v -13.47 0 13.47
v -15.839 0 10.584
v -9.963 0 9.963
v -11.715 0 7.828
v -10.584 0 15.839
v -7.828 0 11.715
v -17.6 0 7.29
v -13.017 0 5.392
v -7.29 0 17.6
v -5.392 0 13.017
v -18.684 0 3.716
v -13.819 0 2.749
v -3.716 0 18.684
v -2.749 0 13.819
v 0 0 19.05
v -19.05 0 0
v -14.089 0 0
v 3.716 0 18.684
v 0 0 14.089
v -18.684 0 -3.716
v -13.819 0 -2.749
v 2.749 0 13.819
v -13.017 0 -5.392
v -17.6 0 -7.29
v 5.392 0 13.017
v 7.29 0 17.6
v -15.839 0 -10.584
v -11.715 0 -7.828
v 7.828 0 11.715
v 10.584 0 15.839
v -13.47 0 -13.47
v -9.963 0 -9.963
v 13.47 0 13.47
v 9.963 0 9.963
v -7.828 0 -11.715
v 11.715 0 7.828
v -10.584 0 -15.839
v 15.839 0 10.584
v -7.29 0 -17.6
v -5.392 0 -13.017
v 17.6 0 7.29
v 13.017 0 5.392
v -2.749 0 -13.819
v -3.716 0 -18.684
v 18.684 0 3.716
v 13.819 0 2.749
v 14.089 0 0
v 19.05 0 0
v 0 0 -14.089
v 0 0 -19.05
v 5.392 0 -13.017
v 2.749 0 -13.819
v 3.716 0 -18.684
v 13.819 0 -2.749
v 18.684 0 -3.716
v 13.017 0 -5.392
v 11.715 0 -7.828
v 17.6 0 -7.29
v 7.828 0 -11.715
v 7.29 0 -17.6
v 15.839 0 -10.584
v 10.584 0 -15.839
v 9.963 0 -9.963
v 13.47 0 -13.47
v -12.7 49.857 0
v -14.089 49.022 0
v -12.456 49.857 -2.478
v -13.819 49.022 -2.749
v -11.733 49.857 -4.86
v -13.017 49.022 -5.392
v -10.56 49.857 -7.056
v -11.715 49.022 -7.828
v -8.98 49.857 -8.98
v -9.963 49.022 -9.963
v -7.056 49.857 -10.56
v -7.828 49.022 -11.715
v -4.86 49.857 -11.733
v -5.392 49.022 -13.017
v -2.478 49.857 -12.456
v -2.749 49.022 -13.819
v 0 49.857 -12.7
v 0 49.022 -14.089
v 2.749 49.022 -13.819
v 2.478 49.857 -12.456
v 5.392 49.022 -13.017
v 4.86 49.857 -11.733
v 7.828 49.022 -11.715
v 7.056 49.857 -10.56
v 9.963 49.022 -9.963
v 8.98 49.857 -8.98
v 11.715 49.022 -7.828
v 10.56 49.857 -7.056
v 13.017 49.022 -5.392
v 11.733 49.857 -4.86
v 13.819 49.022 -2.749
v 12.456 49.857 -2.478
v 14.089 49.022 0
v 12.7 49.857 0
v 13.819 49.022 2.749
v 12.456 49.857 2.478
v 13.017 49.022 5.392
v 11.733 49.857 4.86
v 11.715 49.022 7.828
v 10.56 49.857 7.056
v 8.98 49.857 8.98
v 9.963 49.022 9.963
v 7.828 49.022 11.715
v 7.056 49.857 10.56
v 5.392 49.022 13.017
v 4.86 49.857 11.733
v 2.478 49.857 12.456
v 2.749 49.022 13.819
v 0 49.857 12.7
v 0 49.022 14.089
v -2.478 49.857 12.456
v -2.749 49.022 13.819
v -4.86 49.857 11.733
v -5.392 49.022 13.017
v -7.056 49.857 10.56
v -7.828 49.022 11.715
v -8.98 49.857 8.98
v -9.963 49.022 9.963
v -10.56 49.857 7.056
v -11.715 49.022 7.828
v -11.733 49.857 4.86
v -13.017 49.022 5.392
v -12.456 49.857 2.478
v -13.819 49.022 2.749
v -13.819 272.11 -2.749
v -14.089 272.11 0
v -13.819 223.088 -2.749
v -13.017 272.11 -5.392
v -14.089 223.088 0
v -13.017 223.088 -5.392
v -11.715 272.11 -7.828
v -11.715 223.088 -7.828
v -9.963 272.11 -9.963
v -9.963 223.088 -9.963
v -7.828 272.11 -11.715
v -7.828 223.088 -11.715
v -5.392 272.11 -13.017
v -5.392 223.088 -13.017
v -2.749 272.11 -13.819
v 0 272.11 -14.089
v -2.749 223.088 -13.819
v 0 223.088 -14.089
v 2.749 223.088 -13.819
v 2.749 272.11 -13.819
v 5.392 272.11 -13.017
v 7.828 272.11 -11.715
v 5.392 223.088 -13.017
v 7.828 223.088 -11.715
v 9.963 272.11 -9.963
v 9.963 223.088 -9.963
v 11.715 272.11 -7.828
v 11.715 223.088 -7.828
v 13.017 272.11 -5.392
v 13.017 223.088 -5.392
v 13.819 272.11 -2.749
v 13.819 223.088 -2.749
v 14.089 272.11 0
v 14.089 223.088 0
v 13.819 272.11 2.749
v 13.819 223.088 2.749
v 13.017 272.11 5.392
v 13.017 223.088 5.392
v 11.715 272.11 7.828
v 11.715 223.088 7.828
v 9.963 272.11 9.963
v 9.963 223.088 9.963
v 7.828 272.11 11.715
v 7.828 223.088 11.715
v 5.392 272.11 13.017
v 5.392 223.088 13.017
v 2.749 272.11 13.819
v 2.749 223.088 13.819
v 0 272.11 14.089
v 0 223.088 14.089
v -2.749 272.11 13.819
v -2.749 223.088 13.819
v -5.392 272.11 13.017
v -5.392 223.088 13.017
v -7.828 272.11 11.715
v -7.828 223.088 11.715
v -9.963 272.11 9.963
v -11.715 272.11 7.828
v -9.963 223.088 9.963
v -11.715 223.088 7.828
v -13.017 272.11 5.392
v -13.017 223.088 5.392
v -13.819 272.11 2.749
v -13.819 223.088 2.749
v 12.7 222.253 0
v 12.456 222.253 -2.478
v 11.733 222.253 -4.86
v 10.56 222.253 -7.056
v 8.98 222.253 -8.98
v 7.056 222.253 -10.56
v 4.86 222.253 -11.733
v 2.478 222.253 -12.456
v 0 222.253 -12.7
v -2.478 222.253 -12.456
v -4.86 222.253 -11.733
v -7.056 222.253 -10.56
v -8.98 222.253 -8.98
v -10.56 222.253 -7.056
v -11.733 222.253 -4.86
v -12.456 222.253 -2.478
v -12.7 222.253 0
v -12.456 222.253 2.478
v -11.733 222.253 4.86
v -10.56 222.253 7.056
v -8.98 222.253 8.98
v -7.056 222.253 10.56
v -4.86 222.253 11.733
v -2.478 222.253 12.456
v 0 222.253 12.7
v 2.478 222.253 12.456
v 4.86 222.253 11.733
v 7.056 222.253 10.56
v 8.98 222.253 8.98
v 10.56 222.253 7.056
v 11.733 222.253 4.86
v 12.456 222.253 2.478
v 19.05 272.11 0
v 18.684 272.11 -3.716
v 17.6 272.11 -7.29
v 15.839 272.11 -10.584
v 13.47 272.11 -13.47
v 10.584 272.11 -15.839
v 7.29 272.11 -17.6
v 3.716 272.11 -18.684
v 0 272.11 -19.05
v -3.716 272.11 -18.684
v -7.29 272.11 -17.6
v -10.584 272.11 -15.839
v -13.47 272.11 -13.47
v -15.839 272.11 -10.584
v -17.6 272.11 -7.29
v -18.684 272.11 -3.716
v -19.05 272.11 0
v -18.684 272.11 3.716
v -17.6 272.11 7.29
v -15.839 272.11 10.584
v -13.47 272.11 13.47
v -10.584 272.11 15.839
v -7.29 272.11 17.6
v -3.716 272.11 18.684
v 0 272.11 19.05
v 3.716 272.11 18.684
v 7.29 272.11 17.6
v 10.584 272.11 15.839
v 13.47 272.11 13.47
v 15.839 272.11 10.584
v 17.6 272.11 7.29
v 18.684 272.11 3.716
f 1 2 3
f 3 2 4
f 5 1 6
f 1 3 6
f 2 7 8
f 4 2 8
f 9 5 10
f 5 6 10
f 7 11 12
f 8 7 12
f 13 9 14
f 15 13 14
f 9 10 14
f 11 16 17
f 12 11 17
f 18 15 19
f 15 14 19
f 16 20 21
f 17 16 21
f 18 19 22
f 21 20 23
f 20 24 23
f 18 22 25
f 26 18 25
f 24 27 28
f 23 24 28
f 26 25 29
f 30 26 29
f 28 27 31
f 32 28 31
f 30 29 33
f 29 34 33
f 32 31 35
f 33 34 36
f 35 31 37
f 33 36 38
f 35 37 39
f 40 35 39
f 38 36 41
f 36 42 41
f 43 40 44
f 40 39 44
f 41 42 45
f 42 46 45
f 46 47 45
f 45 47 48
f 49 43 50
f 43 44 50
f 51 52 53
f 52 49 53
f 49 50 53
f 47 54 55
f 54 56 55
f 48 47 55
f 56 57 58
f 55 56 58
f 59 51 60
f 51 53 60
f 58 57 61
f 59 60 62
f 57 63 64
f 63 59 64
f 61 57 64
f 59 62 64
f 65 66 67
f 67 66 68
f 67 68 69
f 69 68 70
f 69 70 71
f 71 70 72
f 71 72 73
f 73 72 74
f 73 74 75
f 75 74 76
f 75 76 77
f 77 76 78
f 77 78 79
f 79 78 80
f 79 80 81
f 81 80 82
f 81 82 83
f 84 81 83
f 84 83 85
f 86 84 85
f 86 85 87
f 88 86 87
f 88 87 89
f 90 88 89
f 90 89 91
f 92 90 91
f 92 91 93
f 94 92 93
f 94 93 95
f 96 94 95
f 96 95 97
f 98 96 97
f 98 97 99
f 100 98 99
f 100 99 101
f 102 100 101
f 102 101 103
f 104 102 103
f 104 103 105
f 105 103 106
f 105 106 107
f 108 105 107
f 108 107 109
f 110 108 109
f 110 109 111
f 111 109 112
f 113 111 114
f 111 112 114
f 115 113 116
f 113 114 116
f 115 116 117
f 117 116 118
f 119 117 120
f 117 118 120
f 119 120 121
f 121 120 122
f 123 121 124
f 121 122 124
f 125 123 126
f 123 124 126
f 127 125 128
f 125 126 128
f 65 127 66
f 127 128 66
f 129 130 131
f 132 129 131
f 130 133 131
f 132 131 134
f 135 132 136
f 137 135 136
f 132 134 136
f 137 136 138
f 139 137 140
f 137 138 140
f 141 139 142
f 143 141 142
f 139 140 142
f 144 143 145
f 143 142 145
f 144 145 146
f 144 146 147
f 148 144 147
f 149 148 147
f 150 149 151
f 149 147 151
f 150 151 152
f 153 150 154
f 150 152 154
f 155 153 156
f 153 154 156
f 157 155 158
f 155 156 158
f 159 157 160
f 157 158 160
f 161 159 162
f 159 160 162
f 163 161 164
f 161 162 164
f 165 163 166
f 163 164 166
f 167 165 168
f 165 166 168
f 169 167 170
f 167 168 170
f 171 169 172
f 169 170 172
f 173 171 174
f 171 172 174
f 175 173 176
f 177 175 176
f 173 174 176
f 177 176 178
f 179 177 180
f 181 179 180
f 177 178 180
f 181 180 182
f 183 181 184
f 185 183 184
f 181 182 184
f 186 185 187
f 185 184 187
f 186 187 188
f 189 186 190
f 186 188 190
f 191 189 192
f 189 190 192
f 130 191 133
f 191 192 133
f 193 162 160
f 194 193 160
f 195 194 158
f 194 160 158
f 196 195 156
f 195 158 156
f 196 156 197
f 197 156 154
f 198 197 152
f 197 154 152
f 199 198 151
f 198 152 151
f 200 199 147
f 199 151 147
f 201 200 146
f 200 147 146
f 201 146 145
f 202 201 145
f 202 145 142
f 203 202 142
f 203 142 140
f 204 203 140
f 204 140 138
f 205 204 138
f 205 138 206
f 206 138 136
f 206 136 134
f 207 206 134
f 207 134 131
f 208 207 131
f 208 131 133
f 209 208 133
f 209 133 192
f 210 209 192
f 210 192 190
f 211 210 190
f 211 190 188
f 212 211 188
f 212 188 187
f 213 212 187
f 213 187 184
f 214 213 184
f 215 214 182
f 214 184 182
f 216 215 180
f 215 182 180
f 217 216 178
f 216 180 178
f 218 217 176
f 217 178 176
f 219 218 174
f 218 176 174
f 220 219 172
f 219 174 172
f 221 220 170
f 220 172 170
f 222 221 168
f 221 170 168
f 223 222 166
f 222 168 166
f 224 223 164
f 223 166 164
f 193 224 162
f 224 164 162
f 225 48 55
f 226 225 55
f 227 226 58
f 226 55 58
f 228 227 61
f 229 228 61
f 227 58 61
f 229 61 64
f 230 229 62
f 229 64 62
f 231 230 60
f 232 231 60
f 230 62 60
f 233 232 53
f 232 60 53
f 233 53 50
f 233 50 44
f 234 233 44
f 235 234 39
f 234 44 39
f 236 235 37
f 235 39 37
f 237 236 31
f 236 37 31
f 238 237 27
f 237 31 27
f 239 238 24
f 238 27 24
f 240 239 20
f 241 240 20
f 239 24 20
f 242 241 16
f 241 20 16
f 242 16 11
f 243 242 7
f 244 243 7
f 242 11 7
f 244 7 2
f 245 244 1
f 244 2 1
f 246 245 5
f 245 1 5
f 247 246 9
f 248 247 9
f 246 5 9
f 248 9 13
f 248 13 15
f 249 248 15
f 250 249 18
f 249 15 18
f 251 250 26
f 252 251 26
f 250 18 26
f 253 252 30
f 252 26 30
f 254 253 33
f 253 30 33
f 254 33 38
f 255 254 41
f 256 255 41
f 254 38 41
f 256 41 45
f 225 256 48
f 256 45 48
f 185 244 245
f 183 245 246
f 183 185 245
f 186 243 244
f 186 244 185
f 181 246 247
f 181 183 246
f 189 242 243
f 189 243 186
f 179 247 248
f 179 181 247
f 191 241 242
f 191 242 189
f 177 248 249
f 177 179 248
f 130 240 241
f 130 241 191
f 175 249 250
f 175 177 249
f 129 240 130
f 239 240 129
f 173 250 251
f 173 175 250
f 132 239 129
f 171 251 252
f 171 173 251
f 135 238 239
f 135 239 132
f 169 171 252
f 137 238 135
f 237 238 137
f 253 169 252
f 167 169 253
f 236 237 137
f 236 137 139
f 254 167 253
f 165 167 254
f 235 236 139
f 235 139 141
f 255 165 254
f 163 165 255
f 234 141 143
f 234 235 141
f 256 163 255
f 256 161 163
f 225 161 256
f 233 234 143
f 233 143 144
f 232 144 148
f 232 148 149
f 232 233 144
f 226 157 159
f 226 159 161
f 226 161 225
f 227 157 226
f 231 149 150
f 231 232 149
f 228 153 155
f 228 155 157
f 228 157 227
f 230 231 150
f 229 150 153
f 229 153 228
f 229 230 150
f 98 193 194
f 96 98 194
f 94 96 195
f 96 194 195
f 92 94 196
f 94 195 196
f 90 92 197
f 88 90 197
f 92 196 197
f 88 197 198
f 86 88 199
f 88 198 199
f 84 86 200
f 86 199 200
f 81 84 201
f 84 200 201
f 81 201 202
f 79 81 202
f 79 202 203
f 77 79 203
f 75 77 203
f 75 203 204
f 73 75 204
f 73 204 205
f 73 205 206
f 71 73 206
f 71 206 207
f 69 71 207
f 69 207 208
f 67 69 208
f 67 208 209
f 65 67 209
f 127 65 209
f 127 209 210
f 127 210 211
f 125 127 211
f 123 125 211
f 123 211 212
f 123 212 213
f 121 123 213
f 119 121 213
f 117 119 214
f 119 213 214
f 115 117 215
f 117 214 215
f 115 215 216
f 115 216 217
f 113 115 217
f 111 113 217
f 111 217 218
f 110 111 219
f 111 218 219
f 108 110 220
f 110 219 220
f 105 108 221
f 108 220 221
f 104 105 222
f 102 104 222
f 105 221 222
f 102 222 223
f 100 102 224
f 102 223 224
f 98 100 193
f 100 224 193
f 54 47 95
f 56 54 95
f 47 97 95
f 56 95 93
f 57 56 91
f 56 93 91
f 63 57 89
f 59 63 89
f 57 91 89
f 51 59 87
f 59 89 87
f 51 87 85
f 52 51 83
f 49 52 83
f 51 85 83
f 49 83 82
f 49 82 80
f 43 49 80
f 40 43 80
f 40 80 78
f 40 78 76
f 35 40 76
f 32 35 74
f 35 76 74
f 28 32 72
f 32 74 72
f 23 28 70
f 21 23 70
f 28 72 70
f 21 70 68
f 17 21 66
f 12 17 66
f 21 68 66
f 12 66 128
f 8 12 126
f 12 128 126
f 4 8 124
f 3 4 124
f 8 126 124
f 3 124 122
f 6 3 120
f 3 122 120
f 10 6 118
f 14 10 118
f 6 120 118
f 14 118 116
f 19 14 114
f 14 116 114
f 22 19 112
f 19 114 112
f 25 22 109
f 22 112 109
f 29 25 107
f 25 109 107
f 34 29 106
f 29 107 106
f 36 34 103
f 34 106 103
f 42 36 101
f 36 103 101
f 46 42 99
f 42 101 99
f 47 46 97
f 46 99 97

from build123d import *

# Parameters (mm, degrees)
SKETCH1_R                    = 19.05
BOSS_EXTRUDE1_DEPTH          = 272.1102
SKETCH2_R                    = 12.7
CUT_EXTRUDE1_DEPTH           = 273.1102
F_1_1_4_7_TAPPED_HOLE1_D     = 28.17876
F_1_1_4_7_TAPPED_HOLE1_DEPTH = 49.022
F_1_1_4_7_TAPPED_HOLE1_TIP   = 8.465753589
F_1_1_4_7_TAPPED_HOLE2_D     = 28.17876
F_1_1_4_7_TAPPED_HOLE2_DEPTH = 49.022
F_1_1_4_7_TAPPED_HOLE2_TIP   = 8.465753589


with BuildPart() as part:
    # Sketch1 → Boss-Extrude1 (new body)
    with BuildSketch(Plane(origin=(0, 0, 0), x_dir=(1, 0, 0), z_dir=(0, 1, 0))):
        Circle(SKETCH1_R)
    extrude(amount=BOSS_EXTRUDE1_DEPTH)

    # Sketch2 → Cut-Extrude1 (cut, through all)
    with BuildSketch(Plane(origin=(0, 272.1102, 0), x_dir=(1, 0, 0), z_dir=(0, 1, 0))):
        Circle(SKETCH2_R)
    extrude(amount=-CUT_EXTRUDE1_DEPTH, mode=Mode.SUBTRACT)

    # 1-1/4-7 Tapped Hole1
    with Locations(Plane(origin=(0, 272.1102, 0), x_dir=(1, 0, 0), z_dir=(0, 1, 0))):
        with Locations((0, 0)):
            Hole(F_1_1_4_7_TAPPED_HOLE1_D / 2, depth=F_1_1_4_7_TAPPED_HOLE1_DEPTH)
            with Locations((0, 0, -(F_1_1_4_7_TAPPED_HOLE1_DEPTH + F_1_1_4_7_TAPPED_HOLE1_TIP / 2))):  # 118° drill point
                Cone(0, F_1_1_4_7_TAPPED_HOLE1_D / 2, F_1_1_4_7_TAPPED_HOLE1_TIP, mode=Mode.SUBTRACT)

    # 1-1/4-7 Tapped Hole2
    with Locations(Plane(origin=(0, 0, 0), x_dir=(-1, 0, 0), z_dir=(0, -1, 0))):
        with Locations((0, 0)):
            Hole(F_1_1_4_7_TAPPED_HOLE2_D / 2, depth=F_1_1_4_7_TAPPED_HOLE2_DEPTH)
            with Locations((0, 0, -(F_1_1_4_7_TAPPED_HOLE2_DEPTH + F_1_1_4_7_TAPPED_HOLE2_TIP / 2))):  # 118° drill point
                Cone(0, F_1_1_4_7_TAPPED_HOLE2_D / 2, F_1_1_4_7_TAPPED_HOLE2_TIP, mode=Mode.SUBTRACT)


solid = part.part
